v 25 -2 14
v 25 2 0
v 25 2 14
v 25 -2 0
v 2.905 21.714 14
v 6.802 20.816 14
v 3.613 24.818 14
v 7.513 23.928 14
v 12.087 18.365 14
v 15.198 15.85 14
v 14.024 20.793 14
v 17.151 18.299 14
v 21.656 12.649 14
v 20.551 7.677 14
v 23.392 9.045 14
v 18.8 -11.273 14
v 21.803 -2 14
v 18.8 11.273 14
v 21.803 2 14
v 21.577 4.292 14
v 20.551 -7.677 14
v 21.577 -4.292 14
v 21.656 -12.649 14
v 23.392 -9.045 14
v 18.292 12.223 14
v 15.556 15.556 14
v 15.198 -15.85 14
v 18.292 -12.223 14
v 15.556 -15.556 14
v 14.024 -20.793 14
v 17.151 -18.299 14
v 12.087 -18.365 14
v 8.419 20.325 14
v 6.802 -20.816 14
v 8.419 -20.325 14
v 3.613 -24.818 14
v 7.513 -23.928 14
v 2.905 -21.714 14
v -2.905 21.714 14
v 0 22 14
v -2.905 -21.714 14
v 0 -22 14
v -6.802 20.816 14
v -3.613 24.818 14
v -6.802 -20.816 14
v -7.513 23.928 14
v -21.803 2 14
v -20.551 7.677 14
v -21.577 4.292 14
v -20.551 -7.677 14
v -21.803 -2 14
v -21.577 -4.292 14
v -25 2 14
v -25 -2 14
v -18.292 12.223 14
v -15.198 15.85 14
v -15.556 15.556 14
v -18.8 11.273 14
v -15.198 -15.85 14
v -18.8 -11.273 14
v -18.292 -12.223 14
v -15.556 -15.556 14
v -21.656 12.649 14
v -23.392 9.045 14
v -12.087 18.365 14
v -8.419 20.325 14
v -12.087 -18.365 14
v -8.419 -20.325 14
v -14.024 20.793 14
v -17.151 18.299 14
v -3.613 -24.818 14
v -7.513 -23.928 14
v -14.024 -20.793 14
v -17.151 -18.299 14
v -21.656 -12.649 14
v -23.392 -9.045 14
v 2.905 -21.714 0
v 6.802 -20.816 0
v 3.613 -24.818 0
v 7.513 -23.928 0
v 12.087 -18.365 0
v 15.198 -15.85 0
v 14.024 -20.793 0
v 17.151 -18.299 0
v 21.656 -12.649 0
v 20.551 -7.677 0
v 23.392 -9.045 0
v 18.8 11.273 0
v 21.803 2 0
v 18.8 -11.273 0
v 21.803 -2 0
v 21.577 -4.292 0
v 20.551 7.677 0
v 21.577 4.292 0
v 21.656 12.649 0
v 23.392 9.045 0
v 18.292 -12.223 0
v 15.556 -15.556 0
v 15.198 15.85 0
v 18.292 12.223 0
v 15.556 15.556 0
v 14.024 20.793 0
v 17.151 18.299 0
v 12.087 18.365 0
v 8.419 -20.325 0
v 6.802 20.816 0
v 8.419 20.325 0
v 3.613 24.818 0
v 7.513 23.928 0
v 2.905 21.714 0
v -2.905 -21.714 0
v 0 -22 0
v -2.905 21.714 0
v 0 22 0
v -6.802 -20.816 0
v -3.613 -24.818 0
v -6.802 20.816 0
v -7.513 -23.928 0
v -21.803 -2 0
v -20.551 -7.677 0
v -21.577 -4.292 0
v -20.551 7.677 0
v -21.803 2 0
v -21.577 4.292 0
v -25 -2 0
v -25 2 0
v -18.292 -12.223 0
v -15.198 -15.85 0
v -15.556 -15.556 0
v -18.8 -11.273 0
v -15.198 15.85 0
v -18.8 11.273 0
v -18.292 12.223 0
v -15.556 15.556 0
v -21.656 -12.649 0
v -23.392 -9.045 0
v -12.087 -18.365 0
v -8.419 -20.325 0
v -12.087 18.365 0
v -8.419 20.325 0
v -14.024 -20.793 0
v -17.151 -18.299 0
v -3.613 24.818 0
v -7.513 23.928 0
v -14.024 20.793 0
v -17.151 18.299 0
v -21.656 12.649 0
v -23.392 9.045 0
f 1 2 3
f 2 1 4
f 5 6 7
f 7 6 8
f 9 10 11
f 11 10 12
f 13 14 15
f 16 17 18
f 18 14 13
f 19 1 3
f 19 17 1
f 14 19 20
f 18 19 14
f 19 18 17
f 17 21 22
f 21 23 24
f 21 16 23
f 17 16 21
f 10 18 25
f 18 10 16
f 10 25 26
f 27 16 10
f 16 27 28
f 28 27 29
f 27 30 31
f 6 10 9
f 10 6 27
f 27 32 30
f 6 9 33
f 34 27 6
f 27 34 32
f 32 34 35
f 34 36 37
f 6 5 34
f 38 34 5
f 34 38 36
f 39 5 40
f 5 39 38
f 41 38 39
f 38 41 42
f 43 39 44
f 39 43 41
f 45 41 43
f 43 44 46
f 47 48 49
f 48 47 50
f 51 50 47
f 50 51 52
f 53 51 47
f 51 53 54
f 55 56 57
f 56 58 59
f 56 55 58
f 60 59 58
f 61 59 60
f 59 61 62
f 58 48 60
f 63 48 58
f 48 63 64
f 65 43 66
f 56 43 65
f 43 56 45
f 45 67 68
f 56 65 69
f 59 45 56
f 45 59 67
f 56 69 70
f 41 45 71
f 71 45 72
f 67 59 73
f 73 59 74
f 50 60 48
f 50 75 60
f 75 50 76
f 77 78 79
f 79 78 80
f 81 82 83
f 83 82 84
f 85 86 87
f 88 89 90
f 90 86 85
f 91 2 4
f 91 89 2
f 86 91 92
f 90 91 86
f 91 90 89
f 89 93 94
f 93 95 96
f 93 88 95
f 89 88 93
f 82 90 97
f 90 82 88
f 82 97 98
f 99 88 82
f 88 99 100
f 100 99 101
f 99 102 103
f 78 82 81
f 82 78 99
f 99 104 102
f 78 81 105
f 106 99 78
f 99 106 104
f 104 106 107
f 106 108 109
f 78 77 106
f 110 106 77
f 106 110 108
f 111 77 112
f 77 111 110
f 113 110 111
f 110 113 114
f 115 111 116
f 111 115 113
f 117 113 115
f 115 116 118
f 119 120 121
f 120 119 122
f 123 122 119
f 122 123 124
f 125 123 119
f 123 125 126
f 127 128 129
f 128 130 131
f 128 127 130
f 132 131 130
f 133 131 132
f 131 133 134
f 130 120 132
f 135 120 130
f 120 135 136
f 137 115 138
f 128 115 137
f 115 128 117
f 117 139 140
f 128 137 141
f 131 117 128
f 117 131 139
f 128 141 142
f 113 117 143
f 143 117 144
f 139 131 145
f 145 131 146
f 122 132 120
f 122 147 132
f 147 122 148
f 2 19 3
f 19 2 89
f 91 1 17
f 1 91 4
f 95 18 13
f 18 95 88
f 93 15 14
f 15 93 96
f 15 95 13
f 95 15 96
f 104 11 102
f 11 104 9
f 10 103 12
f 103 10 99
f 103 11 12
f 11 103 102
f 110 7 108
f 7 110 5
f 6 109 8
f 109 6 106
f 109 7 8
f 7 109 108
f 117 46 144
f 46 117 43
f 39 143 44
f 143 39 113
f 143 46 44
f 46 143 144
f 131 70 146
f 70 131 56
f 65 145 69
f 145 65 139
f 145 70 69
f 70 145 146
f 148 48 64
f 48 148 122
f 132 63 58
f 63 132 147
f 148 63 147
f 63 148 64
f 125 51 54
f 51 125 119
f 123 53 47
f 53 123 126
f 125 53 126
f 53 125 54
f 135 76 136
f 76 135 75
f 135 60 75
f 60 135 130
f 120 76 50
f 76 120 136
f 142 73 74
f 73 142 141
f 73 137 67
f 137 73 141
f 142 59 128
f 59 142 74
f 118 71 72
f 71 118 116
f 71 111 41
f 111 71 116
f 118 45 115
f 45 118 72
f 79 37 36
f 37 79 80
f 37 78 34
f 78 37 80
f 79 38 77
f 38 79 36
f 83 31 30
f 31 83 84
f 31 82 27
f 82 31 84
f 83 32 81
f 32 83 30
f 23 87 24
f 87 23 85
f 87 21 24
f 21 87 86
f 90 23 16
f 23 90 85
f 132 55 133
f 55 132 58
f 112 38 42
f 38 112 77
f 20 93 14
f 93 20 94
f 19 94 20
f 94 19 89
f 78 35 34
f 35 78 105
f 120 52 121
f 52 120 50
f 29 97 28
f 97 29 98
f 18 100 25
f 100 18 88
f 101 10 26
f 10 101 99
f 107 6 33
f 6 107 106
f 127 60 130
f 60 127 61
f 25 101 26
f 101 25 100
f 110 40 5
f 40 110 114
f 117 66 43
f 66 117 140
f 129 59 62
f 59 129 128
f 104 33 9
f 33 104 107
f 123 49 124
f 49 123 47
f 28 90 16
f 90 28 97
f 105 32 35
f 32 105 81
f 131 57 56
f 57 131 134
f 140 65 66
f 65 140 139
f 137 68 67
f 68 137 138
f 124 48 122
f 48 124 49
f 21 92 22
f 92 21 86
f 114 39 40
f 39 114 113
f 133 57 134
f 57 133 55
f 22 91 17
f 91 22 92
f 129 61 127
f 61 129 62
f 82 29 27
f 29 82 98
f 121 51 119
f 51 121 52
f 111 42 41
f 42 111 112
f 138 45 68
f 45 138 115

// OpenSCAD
$fn = 32;

// ----------------------------------------------------------------------
// Spur blank: plain gear blank
// ----------------------------------------------------------------------

// --- parameters (mm) ---
disc_r = 22;              // blank root radius
disc_t = 14;              // blank thickness
n_teeth = 14;             // stub tooth count
tooth_w = 4;              // tooth width at the root
tooth_h = 3;              // tooth height above the root
fit_tol = 0.05;           // tolerance for press fits, mm
free_tol = 0.2;           // tolerance for clearance fits, mm

out_r = disc_r + tooth_h;  // tip radius
bbox_x = 50.0;  // measured width over the teeth
bbox_y = 49.64;  // measured depth over the teeth

union() {
  cylinder(r = disc_r, h = disc_t);
  for (i = [0 : n_teeth - 1])
    rotate([0, 0, i * 360 / n_teeth])
      translate([disc_r - 1, -tooth_w / 2, 0])
        cube([tooth_h + 1, tooth_w, disc_t]);
}
